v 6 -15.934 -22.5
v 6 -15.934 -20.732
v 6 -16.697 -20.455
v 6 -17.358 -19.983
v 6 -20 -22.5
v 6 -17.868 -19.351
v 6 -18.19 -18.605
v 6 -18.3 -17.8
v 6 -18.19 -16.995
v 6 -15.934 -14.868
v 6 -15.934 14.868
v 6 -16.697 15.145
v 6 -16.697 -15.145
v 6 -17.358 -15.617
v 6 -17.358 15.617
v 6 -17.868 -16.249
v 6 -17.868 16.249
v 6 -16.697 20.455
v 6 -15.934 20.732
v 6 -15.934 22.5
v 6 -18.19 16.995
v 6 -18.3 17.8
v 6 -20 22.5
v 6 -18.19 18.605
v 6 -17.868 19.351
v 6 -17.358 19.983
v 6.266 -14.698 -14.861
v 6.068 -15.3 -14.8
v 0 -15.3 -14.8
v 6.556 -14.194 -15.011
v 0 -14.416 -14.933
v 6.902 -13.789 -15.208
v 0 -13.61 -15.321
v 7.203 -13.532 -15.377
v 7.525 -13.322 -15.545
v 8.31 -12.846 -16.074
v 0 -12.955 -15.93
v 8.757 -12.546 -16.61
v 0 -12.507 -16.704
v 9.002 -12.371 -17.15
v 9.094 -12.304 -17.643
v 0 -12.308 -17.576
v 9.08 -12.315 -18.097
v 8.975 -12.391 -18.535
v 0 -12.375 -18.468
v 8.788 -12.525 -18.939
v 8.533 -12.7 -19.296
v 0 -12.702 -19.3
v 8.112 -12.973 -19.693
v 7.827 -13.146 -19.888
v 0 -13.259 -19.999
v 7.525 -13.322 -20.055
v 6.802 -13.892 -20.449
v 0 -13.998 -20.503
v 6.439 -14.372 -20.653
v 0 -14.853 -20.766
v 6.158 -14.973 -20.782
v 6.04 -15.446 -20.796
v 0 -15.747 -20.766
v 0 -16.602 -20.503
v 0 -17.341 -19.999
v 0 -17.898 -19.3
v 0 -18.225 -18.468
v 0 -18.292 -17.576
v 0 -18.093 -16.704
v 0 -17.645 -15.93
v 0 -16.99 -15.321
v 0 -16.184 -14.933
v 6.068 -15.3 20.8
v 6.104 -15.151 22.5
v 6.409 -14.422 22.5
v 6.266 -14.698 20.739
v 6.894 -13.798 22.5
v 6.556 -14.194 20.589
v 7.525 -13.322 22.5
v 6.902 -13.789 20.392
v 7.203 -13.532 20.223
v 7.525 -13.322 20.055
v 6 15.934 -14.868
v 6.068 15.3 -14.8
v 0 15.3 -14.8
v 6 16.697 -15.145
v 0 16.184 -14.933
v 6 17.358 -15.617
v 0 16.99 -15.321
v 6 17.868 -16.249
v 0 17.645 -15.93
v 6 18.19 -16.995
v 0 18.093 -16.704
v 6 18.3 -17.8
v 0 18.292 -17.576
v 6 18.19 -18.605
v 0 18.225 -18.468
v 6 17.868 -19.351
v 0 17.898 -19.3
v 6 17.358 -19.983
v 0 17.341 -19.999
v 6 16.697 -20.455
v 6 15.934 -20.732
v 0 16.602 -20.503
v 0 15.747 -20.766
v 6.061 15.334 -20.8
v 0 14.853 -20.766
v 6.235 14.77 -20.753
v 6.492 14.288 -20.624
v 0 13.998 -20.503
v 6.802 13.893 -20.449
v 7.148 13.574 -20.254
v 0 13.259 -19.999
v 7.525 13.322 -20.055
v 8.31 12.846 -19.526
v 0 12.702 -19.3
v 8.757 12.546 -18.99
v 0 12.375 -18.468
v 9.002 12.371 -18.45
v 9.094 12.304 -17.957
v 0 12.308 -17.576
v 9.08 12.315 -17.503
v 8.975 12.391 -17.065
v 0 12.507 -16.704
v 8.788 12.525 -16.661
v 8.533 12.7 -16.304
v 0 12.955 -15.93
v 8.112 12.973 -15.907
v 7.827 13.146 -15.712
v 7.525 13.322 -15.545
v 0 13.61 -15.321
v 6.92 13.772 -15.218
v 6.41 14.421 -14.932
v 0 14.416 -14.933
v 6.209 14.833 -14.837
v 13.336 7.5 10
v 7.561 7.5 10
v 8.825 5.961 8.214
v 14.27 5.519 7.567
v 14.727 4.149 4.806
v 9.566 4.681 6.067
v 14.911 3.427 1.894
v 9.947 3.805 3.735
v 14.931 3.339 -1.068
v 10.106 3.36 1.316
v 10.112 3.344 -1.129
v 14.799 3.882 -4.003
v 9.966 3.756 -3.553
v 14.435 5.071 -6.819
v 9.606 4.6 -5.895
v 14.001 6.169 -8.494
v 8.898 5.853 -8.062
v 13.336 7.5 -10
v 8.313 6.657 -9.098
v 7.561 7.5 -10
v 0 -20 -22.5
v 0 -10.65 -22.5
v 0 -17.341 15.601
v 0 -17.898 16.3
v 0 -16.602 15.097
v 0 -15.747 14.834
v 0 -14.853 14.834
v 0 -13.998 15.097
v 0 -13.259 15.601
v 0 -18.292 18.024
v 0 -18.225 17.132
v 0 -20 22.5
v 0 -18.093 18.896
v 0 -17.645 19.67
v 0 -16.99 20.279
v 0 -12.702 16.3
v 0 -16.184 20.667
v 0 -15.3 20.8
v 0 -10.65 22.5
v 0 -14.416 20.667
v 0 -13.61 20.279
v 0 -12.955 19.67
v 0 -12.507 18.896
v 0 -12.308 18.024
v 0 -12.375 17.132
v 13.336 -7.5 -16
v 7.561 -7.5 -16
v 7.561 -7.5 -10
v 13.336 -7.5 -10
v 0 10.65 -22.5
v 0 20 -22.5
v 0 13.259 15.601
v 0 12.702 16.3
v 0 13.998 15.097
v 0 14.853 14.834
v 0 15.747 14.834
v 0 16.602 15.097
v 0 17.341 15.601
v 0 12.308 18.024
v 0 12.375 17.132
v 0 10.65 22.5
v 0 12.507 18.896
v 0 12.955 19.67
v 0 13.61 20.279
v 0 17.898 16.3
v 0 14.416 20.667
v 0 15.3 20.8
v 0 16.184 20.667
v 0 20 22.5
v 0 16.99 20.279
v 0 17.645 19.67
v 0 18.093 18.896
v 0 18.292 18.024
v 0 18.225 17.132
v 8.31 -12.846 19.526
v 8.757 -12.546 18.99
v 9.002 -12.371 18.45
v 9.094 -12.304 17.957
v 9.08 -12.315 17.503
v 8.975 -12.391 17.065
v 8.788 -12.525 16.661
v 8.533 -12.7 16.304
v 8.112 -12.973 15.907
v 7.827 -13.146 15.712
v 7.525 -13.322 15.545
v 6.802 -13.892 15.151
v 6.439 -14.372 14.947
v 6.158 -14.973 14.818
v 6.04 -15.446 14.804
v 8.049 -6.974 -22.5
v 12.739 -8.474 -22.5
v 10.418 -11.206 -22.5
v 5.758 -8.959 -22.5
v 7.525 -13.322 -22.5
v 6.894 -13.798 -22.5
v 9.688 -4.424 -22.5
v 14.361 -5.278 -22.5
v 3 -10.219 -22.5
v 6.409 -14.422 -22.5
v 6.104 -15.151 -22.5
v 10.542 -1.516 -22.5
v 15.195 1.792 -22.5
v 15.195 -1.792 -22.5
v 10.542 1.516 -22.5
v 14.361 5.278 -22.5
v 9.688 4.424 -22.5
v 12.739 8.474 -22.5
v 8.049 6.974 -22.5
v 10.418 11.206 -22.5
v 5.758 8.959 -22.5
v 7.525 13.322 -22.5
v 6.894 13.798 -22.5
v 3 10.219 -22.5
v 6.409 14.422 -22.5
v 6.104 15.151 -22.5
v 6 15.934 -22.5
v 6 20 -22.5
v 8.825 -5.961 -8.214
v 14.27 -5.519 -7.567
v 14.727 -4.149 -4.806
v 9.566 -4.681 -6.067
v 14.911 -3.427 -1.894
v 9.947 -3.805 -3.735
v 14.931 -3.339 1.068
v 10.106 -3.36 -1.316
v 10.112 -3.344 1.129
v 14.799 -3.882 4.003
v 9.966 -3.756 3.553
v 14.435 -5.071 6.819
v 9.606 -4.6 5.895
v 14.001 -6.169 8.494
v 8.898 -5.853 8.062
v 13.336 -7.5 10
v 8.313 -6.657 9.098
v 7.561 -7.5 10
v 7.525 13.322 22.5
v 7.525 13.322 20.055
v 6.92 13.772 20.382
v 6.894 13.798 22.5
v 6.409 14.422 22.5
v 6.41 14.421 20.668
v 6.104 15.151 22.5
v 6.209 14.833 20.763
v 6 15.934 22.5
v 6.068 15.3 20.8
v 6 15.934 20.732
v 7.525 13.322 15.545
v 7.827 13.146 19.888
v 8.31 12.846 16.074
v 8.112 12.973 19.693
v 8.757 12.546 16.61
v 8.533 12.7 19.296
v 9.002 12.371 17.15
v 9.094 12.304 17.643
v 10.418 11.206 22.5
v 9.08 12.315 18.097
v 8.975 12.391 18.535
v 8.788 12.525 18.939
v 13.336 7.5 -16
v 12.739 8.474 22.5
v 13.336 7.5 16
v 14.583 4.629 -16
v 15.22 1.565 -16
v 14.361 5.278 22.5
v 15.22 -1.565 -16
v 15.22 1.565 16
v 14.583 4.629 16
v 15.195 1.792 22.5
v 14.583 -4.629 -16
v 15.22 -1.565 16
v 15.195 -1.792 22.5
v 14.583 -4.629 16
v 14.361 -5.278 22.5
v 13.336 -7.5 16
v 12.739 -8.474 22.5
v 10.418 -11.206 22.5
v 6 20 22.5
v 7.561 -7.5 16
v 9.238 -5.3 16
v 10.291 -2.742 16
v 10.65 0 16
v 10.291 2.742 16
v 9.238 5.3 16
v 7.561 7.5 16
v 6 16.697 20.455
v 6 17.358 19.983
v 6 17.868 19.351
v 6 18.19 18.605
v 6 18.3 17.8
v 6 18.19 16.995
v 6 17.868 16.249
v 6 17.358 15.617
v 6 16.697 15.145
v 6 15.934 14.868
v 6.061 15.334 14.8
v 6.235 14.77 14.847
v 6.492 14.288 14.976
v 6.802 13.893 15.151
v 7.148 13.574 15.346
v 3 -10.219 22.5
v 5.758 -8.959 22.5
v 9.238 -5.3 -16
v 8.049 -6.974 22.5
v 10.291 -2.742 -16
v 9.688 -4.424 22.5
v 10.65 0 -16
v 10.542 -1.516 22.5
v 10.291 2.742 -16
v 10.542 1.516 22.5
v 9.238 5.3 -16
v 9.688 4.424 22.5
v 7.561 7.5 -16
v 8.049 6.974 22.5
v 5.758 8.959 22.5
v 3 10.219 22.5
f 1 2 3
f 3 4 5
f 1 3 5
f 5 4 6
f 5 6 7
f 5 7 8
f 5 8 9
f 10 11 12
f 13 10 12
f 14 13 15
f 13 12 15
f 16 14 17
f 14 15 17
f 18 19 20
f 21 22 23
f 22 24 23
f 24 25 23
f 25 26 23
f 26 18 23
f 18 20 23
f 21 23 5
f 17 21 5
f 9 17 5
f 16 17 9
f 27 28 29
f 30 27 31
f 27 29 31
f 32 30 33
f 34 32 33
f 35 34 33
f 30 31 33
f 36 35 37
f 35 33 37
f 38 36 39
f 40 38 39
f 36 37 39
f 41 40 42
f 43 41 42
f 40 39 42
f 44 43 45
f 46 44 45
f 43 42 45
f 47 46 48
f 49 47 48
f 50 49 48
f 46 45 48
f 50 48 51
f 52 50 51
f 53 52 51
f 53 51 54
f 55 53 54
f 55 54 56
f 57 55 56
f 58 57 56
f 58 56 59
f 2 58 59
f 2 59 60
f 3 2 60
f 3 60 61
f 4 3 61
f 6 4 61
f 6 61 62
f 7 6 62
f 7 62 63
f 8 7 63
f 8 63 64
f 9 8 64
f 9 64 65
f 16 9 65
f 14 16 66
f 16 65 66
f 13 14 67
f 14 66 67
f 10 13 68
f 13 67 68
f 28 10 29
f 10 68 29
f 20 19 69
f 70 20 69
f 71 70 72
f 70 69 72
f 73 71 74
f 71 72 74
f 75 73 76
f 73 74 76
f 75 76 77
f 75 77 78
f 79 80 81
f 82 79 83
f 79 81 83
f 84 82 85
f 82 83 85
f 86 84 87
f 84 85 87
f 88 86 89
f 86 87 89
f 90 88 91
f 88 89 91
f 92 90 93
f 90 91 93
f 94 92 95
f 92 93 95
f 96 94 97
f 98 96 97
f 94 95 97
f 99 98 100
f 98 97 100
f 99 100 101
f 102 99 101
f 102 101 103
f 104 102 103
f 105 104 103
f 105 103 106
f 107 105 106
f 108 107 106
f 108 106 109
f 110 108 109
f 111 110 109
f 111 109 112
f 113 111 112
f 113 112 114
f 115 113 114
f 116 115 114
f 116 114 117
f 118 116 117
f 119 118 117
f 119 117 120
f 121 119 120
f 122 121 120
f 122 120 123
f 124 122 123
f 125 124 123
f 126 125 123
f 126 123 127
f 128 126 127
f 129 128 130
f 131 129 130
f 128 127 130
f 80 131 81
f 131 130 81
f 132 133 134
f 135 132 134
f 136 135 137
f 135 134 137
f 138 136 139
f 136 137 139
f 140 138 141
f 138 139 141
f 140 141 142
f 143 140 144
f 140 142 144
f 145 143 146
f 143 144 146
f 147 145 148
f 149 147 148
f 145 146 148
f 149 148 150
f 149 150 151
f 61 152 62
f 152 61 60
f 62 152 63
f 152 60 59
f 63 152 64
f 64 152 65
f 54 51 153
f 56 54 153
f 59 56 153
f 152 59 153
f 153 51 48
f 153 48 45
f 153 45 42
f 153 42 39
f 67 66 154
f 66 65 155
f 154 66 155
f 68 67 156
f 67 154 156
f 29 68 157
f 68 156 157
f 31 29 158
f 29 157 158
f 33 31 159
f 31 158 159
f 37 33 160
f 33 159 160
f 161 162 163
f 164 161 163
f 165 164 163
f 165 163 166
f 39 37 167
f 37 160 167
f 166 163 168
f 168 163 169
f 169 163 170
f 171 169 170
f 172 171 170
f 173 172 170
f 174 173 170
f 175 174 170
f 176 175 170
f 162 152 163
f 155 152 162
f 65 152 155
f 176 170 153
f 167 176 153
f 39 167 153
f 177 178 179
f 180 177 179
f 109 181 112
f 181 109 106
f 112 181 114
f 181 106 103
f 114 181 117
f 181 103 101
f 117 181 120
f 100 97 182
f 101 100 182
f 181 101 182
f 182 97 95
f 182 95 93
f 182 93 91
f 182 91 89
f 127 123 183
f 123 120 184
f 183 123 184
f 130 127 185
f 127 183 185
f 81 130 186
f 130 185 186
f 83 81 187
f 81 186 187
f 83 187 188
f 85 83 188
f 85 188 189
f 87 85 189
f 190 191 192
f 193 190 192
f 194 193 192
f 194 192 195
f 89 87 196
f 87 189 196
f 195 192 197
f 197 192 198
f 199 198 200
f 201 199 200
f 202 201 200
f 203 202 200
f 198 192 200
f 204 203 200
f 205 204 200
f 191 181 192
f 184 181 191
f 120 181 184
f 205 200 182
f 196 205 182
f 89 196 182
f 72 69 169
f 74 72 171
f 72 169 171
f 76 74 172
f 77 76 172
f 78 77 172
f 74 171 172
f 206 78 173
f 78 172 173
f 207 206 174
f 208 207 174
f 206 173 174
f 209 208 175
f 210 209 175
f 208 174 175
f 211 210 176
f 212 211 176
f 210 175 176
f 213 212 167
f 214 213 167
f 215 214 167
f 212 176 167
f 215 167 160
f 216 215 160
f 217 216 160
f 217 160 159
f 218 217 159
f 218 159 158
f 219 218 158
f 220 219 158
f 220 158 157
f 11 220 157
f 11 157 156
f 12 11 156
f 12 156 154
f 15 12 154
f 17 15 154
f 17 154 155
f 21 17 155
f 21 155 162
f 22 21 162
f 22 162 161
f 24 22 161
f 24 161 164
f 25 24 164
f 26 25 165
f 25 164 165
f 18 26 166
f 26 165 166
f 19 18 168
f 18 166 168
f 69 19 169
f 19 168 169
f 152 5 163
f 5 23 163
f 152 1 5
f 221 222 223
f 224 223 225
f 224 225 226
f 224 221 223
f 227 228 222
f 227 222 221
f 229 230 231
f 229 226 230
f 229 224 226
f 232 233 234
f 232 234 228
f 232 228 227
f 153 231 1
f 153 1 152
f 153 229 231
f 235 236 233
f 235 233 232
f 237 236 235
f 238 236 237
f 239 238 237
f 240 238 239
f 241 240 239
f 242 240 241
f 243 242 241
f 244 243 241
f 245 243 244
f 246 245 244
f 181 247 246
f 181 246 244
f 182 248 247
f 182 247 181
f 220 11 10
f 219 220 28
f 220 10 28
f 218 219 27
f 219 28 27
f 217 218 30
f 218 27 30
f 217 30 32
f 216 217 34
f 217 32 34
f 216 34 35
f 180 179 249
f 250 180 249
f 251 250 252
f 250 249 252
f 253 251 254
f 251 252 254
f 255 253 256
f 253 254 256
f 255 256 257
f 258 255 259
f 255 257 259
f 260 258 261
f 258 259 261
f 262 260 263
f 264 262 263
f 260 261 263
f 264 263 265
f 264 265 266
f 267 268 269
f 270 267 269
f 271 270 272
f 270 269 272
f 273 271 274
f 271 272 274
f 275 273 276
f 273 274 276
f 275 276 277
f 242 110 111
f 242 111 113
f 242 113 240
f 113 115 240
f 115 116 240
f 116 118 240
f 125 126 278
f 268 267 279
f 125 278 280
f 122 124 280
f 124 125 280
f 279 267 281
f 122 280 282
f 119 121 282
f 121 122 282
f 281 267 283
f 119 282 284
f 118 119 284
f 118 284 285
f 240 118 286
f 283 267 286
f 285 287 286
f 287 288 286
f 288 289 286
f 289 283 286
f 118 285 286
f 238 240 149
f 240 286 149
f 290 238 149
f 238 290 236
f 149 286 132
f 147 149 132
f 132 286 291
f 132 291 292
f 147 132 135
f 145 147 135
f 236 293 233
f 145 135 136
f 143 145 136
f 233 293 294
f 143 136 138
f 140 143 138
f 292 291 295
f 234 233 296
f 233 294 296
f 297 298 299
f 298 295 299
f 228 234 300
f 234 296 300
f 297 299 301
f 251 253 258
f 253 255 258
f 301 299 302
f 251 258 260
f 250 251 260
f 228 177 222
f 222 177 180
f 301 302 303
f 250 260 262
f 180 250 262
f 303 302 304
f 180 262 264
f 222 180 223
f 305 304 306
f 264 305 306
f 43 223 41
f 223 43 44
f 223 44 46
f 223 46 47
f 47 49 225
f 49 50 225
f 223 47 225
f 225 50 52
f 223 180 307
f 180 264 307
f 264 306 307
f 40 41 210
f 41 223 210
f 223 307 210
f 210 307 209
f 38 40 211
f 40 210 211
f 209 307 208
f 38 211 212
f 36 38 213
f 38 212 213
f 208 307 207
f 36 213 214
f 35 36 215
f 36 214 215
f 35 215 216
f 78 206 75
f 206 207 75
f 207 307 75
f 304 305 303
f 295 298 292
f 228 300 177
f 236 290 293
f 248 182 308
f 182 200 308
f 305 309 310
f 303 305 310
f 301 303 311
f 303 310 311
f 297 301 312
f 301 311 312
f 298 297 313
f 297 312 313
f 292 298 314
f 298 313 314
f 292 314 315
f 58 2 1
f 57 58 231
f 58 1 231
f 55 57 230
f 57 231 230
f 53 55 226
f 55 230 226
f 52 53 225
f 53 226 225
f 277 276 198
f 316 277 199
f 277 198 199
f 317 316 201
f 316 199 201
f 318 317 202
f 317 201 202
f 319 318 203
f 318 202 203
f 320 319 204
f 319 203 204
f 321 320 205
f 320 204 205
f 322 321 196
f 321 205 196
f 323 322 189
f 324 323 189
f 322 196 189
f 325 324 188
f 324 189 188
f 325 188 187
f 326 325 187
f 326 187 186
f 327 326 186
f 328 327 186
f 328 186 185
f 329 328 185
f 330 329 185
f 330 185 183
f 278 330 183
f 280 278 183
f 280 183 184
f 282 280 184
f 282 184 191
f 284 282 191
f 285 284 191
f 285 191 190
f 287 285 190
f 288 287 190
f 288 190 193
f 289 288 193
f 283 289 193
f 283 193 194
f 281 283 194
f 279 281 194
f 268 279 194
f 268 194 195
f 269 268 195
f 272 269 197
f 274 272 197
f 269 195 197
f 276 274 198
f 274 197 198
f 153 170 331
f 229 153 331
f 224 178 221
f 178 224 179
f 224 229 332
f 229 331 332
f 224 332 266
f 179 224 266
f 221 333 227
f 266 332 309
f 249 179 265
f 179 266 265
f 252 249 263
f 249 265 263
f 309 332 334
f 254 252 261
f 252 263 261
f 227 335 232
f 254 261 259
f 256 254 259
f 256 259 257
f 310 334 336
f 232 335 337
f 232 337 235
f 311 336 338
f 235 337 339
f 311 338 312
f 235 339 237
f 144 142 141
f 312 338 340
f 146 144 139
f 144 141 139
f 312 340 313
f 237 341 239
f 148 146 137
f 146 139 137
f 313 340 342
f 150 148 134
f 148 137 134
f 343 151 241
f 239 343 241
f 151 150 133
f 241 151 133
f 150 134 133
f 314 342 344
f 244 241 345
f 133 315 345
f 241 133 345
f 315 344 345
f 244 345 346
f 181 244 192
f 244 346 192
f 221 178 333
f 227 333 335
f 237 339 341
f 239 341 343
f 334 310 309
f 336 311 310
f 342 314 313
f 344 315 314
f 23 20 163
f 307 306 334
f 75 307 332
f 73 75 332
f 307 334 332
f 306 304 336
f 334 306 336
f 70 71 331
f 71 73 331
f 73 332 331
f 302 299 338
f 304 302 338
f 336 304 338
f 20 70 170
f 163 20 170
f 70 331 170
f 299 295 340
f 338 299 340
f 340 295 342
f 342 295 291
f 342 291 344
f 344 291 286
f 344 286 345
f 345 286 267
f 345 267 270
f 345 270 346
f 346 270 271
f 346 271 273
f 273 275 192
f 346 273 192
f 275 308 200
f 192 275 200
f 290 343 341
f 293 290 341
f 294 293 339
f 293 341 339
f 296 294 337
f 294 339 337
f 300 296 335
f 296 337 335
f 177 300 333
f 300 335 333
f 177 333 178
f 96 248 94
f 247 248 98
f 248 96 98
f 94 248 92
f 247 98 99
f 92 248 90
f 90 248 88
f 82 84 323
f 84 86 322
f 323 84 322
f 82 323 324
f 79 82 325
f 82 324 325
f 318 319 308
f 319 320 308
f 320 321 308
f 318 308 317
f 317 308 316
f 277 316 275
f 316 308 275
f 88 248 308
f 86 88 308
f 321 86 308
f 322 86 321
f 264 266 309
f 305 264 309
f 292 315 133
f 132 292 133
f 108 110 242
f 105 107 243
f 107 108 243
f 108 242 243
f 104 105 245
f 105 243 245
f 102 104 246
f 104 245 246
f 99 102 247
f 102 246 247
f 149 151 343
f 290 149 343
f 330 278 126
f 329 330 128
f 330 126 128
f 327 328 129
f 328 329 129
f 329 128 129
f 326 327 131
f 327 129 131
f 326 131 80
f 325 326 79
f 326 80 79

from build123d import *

# Parameters (mm, degrees)
BOSS_EXTRUDE2_DEPTH = 22.5
FILLET1_R           = 3
SKETCH2_R           = 3
CUT_EXTRUDE1_DEPTH  = 45
CUT_EXTRUDE2_DEPTH  = 34.768920734


with BuildPart() as part:
    # Sketch1 → Boss-Extrude2 (new, symmetric)
    with BuildSketch(Plane.XY):
        with BuildLine():
            Line((0, 10.65), (0, 20))
            Line((0, 20), (6, 20))
            Line((6, 20), (6, 14.074444927))
            ThreePointArc((6, 14.074444927), (15.3, 0), (6, -14.074444927))
            Line((6, -14.074444927), (6, -20))
            Line((6, -20), (0, -20))
            Line((0, -20), (0, -10.65))
            ThreePointArc((0, -10.65), (10.65, 0), (0, 10.65))
        make_face()
    extrude(amount=BOSS_EXTRUDE2_DEPTH, both=True)

    # Fillet1
    fillet1_edges = [part.edges().sort_by_distance(p)[0] for p in [
        (6, 14.074444927, 0),
        (6, -14.074444927, 0),
    ]]
    fillet(fillet1_edges, radius=FILLET1_R)

    # Sketch2 → Cut-Extrude1 (cut)
    with BuildSketch(Plane.ZY):
        with Locations((-17.8, 15.3)):
            Circle(SKETCH2_R)
        with Locations((17.8, 15.3)):
            Circle(SKETCH2_R)
        with Locations((17.8, -15.3)):
            Circle(SKETCH2_R)
        with Locations((-17.8, -15.3)):
            Circle(SKETCH2_R)
    extrude(amount=-CUT_EXTRUDE1_DEPTH, mode=Mode.SUBTRACT)

    # Sketch3 → Cut-Extrude2 (cut, through all)
    with BuildSketch(Plane.ZY):
        with BuildLine():
            Line((16, 7.5), (10, 7.5))
            ThreePointArc((10, 7.5), (0, 3.297958971), (-10, 7.5))
            Line((-10, 7.5), (-16, 7.5))
            Line((-16, 7.5), (-16, -7.5))
            Line((-16, -7.5), (-10, -7.5))
            ThreePointArc((-10, -7.5), (0, -3.297958971), (10, -7.5))
            Line((10, -7.5), (16, -7.5))
            Line((16, -7.5), (16, 7.5))
        make_face()
    extrude(amount=-CUT_EXTRUDE2_DEPTH, mode=Mode.SUBTRACT)


solid = part.part
